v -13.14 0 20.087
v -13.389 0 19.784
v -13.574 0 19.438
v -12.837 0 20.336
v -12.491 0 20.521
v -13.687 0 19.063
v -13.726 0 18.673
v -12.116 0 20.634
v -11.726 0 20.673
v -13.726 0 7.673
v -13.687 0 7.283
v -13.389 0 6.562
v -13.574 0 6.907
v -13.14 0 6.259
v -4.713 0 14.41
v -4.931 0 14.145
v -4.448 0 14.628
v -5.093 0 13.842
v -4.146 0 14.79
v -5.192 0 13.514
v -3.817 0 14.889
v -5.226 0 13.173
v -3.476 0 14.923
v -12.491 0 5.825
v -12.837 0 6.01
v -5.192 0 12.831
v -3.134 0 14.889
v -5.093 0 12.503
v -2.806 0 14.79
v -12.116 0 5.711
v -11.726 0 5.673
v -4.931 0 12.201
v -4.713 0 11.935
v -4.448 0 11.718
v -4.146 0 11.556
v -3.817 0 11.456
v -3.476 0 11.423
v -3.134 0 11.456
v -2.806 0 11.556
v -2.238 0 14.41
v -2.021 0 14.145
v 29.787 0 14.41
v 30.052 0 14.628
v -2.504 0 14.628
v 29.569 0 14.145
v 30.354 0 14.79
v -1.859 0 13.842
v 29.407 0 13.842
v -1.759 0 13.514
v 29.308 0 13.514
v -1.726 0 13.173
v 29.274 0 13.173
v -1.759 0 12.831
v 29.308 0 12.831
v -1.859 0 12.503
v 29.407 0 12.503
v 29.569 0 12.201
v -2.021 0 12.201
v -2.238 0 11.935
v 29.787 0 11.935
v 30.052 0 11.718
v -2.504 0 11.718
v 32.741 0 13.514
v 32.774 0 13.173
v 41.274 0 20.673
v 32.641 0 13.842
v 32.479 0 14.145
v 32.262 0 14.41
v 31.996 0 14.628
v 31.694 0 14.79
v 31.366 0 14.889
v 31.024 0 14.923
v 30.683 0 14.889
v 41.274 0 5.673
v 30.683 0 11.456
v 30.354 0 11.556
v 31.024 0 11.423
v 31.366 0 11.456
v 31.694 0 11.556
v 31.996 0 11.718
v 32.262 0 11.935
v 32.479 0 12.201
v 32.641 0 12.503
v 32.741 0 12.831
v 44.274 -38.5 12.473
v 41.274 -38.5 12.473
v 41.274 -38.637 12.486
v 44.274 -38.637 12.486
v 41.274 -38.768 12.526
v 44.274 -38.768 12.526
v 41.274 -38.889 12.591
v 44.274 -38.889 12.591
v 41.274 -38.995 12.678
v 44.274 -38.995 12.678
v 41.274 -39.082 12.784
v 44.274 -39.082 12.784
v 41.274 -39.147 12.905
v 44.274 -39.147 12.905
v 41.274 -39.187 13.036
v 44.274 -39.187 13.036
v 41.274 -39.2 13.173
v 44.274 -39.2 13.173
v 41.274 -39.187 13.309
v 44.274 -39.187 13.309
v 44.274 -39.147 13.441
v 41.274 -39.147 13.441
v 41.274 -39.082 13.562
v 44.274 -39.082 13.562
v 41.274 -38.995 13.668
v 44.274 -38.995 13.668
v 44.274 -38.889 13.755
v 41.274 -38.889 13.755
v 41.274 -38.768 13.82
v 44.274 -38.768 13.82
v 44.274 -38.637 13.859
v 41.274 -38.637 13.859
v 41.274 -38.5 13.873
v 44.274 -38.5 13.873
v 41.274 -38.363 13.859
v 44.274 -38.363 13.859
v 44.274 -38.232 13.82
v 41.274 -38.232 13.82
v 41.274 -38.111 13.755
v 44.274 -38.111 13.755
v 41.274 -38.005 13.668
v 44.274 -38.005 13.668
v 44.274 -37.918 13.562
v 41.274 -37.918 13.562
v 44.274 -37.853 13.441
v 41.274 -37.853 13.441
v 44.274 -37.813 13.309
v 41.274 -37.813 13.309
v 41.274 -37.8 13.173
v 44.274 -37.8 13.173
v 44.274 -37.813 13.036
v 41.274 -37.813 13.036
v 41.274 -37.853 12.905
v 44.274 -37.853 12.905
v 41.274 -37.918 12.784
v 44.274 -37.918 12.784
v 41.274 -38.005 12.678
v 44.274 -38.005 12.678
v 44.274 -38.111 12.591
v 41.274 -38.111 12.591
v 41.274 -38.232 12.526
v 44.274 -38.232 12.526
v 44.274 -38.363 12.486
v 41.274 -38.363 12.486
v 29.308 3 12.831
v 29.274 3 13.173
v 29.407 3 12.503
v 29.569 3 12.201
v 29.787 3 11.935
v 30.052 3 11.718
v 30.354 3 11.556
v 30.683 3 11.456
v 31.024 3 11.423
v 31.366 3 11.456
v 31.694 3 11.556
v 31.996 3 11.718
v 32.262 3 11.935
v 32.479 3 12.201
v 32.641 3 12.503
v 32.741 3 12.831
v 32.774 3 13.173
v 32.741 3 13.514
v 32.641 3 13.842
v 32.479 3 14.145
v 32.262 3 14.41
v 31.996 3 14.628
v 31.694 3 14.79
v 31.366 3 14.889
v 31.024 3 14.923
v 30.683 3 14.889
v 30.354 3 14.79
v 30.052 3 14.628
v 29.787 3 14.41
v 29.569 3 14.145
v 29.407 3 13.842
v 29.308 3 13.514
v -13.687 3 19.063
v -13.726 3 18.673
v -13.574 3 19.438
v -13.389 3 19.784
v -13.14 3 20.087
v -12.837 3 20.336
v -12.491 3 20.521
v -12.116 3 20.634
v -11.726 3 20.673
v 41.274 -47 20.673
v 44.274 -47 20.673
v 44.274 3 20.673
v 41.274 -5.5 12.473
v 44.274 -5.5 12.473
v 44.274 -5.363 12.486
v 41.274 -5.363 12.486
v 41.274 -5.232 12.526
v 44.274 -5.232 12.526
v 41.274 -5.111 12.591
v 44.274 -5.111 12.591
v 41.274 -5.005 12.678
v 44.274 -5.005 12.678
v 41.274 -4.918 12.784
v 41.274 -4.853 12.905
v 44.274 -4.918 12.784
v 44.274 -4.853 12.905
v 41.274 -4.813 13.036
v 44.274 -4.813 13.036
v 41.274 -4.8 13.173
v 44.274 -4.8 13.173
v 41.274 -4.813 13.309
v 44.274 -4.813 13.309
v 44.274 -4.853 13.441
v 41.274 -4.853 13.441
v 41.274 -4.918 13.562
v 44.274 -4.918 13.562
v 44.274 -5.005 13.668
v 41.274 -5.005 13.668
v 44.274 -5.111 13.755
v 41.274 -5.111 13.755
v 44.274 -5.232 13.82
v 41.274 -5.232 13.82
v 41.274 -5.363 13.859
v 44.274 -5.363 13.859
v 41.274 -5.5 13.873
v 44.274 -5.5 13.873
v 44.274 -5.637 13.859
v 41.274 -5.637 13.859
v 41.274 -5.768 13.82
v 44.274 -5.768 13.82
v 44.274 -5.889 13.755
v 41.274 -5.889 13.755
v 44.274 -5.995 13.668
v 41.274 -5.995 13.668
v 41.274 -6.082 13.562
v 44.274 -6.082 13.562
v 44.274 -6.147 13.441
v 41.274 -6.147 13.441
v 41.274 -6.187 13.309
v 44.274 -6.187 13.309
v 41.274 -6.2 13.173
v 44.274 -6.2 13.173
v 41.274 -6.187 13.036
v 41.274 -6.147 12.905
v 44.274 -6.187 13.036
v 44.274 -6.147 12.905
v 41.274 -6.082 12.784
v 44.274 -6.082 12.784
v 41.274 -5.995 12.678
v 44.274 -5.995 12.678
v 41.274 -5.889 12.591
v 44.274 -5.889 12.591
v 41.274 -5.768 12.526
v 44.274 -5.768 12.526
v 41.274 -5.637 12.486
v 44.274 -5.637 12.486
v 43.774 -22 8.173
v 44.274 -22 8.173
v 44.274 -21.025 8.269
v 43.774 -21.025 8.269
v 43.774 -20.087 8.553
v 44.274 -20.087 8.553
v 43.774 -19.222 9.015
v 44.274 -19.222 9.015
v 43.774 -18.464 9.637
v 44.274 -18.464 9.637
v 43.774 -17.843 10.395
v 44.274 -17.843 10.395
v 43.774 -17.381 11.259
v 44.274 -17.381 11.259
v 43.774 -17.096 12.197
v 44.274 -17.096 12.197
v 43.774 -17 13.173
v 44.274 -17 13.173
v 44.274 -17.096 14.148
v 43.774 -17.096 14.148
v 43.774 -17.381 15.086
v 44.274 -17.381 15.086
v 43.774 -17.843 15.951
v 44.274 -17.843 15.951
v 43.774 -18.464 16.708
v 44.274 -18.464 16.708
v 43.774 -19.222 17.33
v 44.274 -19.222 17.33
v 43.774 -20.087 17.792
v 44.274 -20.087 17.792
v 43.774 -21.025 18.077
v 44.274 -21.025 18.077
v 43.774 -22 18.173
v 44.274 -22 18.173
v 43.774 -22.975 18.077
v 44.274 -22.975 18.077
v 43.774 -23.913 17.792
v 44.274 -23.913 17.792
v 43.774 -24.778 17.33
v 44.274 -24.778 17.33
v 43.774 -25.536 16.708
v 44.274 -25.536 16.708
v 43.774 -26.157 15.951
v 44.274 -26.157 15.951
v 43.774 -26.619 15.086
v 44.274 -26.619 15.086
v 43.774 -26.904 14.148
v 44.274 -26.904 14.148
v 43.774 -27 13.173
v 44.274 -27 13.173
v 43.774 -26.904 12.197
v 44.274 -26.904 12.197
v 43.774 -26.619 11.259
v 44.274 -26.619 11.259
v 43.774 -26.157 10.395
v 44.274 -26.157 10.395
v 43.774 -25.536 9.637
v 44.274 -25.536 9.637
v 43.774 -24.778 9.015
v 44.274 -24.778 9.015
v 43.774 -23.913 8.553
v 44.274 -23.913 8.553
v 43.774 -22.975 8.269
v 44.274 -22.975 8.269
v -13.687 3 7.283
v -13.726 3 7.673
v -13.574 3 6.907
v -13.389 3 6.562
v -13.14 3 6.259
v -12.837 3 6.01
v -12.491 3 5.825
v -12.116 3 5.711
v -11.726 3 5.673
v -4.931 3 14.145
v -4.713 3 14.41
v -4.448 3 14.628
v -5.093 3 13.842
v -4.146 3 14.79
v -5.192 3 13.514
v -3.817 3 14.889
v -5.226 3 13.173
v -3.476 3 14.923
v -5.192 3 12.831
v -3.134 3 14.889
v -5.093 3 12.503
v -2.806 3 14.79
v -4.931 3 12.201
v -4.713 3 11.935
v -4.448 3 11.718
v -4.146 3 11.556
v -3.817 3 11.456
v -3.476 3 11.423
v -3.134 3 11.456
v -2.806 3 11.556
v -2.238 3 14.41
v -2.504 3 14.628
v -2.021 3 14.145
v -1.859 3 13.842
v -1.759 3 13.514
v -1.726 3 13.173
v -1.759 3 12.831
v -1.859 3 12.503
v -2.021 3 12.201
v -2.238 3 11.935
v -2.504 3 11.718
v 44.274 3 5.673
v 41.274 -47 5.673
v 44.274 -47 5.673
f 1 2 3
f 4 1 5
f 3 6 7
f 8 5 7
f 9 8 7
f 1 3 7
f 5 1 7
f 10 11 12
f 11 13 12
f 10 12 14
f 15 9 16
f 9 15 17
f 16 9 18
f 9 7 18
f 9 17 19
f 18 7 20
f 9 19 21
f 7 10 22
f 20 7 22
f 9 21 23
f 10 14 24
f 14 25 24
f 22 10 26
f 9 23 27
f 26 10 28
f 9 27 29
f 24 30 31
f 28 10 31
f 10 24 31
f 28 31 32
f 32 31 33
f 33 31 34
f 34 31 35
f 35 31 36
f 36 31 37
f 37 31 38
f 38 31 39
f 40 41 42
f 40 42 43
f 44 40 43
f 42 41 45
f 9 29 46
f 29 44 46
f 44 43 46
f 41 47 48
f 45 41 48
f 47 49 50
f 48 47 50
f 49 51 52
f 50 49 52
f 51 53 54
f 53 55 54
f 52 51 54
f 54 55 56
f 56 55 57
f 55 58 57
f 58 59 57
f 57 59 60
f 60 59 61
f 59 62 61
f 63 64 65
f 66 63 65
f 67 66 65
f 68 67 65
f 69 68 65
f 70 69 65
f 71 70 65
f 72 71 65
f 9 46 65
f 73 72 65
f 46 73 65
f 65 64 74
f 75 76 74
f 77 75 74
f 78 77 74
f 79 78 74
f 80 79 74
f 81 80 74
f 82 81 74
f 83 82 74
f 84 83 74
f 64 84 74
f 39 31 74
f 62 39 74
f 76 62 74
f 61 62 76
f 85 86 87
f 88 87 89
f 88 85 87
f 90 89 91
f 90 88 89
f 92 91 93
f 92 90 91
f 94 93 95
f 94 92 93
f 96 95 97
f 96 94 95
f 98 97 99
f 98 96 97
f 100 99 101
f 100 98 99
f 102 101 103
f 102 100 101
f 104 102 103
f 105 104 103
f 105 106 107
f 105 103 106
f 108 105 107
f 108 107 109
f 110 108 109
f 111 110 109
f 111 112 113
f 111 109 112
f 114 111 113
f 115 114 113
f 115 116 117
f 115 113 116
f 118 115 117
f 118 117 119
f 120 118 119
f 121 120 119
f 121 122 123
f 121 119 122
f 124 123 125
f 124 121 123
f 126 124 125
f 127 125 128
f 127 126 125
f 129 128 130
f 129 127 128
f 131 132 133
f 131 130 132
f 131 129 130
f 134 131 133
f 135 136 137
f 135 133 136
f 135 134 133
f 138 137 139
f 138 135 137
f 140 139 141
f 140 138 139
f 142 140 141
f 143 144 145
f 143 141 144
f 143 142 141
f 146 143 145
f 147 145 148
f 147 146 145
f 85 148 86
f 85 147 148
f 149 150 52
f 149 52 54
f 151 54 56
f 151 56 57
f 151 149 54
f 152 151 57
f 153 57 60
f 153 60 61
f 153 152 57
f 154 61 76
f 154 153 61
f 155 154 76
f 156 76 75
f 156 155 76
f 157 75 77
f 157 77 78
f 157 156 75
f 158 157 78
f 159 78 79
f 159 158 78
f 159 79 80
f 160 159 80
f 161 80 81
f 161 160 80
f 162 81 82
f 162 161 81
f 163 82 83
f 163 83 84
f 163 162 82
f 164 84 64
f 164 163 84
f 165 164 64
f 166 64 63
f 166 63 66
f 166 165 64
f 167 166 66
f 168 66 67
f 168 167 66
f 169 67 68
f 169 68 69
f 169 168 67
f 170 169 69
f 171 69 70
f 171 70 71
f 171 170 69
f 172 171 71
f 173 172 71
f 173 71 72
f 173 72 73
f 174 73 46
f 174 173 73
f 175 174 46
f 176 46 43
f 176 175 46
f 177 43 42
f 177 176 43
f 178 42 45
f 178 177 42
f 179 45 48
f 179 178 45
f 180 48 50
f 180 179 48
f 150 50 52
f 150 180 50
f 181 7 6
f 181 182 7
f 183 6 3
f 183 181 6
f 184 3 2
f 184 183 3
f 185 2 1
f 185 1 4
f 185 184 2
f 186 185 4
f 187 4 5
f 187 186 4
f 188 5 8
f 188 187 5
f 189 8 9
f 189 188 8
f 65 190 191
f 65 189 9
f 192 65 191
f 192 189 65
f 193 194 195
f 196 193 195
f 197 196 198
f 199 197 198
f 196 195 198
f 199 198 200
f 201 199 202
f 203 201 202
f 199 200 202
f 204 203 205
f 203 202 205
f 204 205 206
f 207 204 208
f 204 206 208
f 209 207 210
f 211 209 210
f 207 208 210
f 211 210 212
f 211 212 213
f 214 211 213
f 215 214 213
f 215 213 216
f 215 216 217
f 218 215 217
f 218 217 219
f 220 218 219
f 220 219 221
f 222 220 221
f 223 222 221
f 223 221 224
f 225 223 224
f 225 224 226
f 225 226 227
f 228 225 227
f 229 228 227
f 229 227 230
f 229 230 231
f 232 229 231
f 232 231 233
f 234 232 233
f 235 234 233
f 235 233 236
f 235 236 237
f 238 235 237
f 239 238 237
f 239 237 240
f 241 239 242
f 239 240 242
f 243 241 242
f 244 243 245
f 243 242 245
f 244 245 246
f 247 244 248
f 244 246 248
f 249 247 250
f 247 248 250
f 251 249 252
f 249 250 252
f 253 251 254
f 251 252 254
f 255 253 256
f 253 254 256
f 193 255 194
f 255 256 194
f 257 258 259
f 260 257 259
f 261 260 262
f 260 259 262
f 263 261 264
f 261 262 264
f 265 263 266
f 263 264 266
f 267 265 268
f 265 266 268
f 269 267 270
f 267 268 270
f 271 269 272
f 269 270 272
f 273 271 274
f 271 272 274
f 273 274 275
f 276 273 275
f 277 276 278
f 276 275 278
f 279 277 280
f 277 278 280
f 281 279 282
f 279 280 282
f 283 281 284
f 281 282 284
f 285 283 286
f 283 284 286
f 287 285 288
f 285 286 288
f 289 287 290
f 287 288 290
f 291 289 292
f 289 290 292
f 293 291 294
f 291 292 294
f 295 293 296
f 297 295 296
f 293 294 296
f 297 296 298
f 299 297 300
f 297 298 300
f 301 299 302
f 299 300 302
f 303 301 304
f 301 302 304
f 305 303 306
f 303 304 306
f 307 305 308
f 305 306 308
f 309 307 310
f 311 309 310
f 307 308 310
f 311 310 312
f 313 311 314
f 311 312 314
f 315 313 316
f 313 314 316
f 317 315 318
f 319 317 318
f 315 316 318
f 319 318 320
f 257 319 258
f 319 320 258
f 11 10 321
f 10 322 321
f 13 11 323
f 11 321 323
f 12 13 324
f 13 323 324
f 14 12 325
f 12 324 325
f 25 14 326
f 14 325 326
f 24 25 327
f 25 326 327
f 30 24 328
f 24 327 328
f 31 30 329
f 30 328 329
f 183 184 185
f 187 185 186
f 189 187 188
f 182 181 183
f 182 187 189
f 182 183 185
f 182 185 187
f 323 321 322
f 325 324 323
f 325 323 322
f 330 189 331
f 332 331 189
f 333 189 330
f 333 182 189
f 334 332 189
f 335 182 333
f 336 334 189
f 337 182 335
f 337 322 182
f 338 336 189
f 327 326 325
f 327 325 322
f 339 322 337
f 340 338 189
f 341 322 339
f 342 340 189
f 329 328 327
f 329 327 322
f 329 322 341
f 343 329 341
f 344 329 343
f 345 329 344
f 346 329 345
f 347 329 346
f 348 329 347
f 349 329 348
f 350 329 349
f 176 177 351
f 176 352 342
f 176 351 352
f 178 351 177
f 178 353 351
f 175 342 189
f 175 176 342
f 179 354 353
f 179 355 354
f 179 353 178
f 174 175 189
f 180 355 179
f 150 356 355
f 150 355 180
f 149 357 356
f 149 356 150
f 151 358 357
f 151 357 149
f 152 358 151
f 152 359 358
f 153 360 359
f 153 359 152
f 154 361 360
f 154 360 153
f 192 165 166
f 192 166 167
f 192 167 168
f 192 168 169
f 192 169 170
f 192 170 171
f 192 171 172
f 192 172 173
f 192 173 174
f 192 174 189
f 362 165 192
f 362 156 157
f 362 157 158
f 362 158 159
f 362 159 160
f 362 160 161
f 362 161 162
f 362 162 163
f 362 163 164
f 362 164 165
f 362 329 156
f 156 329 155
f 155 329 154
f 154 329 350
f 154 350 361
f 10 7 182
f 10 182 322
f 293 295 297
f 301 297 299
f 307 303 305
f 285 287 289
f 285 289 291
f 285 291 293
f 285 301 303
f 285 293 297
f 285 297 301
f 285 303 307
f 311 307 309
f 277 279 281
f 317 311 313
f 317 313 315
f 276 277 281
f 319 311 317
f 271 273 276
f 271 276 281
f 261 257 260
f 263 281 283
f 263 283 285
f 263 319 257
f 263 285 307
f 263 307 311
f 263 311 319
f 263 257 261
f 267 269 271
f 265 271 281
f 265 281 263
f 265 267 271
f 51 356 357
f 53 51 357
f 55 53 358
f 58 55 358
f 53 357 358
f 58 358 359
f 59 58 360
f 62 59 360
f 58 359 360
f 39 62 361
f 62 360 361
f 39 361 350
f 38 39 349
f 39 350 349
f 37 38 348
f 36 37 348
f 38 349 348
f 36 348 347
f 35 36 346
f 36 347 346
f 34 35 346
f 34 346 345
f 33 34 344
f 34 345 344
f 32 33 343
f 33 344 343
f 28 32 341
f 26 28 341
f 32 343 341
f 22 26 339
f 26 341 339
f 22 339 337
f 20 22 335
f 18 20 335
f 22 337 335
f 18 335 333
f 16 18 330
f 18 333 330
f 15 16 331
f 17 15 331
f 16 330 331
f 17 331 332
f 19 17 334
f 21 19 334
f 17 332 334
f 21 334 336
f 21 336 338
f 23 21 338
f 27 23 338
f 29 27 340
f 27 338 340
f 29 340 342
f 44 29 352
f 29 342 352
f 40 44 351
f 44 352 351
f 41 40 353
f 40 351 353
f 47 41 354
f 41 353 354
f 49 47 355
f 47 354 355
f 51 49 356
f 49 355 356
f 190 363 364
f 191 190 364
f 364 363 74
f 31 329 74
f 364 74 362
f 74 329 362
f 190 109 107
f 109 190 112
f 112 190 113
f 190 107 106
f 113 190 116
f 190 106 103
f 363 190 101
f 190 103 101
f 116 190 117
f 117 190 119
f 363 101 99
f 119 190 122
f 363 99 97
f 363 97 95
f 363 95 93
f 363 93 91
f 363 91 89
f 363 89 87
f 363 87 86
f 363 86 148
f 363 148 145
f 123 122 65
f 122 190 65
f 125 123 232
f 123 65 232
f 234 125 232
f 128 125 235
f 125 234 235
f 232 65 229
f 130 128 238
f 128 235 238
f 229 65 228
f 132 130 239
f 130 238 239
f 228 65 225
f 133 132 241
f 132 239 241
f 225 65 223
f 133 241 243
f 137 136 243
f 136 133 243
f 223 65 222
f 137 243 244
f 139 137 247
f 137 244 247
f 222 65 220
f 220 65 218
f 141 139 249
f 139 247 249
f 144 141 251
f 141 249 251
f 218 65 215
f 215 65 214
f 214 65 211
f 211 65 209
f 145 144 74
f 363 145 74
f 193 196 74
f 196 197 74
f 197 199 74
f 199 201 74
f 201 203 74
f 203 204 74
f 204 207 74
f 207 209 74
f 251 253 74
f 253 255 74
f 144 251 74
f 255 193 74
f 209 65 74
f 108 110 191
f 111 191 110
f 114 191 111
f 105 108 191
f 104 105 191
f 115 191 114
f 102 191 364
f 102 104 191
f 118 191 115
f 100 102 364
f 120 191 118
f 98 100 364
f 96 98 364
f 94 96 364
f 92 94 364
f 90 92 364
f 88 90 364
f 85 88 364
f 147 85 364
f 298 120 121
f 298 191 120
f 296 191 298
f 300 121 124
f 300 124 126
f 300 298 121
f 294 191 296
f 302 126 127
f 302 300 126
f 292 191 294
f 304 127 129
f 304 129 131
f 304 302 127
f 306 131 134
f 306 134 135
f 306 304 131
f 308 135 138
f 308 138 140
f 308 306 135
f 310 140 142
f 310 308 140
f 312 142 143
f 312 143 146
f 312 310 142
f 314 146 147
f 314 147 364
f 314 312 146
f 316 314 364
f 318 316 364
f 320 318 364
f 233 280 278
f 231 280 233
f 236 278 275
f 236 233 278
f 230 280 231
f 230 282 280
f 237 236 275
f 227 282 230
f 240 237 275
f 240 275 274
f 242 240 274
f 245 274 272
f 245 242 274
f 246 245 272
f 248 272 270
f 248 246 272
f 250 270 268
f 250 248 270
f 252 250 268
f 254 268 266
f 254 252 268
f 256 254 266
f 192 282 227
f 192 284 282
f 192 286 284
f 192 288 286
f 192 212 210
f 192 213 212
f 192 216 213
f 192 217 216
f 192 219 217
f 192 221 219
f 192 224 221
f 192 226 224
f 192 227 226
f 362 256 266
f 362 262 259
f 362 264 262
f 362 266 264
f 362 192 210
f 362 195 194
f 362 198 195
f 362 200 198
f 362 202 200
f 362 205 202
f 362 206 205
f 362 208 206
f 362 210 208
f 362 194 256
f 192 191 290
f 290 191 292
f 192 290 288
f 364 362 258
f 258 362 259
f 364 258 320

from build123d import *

# Parameters (mm, degrees)
SKETCH1_W           = 55
SKETCH1_H           = 15
BOSS_EXTRUDE1_DEPTH = 3
FILLET8_R           = 2
FILLET9_R           = 2
SKETCH2_R           = 1.75
CUT_EXTRUDE1_DEPTH  = 3
SKETCH4_W           = 3
SKETCH4_H           = 15
BOSS_EXTRUDE2_DEPTH = 50
SKETCH6_R           = 0.7
CUT_EXTRUDE2_DEPTH  = 50
SKETCH7_R           = 5
CUT_EXTRUDE3_DEPTH  = 0.5


with BuildPart() as part:
    # Sketch1 → Boss-Extrude1 (new body)
    with BuildSketch(Plane(origin=(0, 0, 0), x_dir=(1, 0, 0), z_dir=(0, 1, 0))):
        with Locations((13.774194124, -13.172794988)):
            Rectangle(SKETCH1_W, SKETCH1_H)
    extrude(amount=BOSS_EXTRUDE1_DEPTH)

    # Fillet8
    fillet8_edges = [part.edges().sort_by_distance(p)[0] for p in [
        (-13.725805876, 1.5, 5.672794988),
    ]]
    fillet(fillet8_edges, radius=FILLET8_R)

    # Fillet9
    fillet9_edges = [part.edges().sort_by_distance(p)[0] for p in [
        (-13.725805876, 1.5, 20.672794988),
    ]]
    fillet(fillet9_edges, radius=FILLET9_R)

    # Sketch2 → Cut-Extrude1 (cut)
    with BuildSketch(Plane(origin=(0, 3, 0), x_dir=(1, 0, 0), z_dir=(0, 1, 0))):
        with Locations((-3.475805876, -13.172794988)):
            Circle(SKETCH2_R)
    cut_extrude1 = extrude(amount=-CUT_EXTRUDE1_DEPTH, mode=Mode.SUBTRACT)

    # Mirror1: Cut-Extrude1 across plane
    add(cut_extrude1.mirror(Plane.ZY.offset(-13.774194124)), mode=Mode.SUBTRACT)

    # Sketch4 → Boss-Extrude2 (add)
    with BuildSketch(Plane(origin=(0, 3, 0), x_dir=(1, 0, 0), z_dir=(0, 1, 0))):
        with Locations((42.774194124, -13.172794988)):
            Rectangle(SKETCH4_W, SKETCH4_H)
    extrude(amount=-BOSS_EXTRUDE2_DEPTH)

    # Sketch6 → Cut-Extrude2 (cut)
    with BuildSketch(Plane(origin=(44.274194124, 0, 0), x_dir=(0, 0, -1), z_dir=(1, 0, 0))):
        with Locations((-13.172794988, -5.5)):
            Circle(SKETCH6_R)
    cut_extrude2 = extrude(amount=-CUT_EXTRUDE2_DEPTH, mode=Mode.SUBTRACT)

    # Mirror2: Cut-Extrude2 across plane
    add(cut_extrude2.mirror(Plane(origin=(0, -22, 0), x_dir=(0, 0, 1), z_dir=(0, -1, 0))), mode=Mode.SUBTRACT)

    # Sketch7 → Cut-Extrude3 (cut)
    with BuildSketch(Plane(origin=(44.274194124, 0, 0), x_dir=(0, 0, -1), z_dir=(1, 0, 0))):
        with Locations((-13.172794988, -22)):
            Circle(SKETCH7_R)
    extrude(amount=-CUT_EXTRUDE3_DEPTH, mode=Mode.SUBTRACT)


solid = part.part
